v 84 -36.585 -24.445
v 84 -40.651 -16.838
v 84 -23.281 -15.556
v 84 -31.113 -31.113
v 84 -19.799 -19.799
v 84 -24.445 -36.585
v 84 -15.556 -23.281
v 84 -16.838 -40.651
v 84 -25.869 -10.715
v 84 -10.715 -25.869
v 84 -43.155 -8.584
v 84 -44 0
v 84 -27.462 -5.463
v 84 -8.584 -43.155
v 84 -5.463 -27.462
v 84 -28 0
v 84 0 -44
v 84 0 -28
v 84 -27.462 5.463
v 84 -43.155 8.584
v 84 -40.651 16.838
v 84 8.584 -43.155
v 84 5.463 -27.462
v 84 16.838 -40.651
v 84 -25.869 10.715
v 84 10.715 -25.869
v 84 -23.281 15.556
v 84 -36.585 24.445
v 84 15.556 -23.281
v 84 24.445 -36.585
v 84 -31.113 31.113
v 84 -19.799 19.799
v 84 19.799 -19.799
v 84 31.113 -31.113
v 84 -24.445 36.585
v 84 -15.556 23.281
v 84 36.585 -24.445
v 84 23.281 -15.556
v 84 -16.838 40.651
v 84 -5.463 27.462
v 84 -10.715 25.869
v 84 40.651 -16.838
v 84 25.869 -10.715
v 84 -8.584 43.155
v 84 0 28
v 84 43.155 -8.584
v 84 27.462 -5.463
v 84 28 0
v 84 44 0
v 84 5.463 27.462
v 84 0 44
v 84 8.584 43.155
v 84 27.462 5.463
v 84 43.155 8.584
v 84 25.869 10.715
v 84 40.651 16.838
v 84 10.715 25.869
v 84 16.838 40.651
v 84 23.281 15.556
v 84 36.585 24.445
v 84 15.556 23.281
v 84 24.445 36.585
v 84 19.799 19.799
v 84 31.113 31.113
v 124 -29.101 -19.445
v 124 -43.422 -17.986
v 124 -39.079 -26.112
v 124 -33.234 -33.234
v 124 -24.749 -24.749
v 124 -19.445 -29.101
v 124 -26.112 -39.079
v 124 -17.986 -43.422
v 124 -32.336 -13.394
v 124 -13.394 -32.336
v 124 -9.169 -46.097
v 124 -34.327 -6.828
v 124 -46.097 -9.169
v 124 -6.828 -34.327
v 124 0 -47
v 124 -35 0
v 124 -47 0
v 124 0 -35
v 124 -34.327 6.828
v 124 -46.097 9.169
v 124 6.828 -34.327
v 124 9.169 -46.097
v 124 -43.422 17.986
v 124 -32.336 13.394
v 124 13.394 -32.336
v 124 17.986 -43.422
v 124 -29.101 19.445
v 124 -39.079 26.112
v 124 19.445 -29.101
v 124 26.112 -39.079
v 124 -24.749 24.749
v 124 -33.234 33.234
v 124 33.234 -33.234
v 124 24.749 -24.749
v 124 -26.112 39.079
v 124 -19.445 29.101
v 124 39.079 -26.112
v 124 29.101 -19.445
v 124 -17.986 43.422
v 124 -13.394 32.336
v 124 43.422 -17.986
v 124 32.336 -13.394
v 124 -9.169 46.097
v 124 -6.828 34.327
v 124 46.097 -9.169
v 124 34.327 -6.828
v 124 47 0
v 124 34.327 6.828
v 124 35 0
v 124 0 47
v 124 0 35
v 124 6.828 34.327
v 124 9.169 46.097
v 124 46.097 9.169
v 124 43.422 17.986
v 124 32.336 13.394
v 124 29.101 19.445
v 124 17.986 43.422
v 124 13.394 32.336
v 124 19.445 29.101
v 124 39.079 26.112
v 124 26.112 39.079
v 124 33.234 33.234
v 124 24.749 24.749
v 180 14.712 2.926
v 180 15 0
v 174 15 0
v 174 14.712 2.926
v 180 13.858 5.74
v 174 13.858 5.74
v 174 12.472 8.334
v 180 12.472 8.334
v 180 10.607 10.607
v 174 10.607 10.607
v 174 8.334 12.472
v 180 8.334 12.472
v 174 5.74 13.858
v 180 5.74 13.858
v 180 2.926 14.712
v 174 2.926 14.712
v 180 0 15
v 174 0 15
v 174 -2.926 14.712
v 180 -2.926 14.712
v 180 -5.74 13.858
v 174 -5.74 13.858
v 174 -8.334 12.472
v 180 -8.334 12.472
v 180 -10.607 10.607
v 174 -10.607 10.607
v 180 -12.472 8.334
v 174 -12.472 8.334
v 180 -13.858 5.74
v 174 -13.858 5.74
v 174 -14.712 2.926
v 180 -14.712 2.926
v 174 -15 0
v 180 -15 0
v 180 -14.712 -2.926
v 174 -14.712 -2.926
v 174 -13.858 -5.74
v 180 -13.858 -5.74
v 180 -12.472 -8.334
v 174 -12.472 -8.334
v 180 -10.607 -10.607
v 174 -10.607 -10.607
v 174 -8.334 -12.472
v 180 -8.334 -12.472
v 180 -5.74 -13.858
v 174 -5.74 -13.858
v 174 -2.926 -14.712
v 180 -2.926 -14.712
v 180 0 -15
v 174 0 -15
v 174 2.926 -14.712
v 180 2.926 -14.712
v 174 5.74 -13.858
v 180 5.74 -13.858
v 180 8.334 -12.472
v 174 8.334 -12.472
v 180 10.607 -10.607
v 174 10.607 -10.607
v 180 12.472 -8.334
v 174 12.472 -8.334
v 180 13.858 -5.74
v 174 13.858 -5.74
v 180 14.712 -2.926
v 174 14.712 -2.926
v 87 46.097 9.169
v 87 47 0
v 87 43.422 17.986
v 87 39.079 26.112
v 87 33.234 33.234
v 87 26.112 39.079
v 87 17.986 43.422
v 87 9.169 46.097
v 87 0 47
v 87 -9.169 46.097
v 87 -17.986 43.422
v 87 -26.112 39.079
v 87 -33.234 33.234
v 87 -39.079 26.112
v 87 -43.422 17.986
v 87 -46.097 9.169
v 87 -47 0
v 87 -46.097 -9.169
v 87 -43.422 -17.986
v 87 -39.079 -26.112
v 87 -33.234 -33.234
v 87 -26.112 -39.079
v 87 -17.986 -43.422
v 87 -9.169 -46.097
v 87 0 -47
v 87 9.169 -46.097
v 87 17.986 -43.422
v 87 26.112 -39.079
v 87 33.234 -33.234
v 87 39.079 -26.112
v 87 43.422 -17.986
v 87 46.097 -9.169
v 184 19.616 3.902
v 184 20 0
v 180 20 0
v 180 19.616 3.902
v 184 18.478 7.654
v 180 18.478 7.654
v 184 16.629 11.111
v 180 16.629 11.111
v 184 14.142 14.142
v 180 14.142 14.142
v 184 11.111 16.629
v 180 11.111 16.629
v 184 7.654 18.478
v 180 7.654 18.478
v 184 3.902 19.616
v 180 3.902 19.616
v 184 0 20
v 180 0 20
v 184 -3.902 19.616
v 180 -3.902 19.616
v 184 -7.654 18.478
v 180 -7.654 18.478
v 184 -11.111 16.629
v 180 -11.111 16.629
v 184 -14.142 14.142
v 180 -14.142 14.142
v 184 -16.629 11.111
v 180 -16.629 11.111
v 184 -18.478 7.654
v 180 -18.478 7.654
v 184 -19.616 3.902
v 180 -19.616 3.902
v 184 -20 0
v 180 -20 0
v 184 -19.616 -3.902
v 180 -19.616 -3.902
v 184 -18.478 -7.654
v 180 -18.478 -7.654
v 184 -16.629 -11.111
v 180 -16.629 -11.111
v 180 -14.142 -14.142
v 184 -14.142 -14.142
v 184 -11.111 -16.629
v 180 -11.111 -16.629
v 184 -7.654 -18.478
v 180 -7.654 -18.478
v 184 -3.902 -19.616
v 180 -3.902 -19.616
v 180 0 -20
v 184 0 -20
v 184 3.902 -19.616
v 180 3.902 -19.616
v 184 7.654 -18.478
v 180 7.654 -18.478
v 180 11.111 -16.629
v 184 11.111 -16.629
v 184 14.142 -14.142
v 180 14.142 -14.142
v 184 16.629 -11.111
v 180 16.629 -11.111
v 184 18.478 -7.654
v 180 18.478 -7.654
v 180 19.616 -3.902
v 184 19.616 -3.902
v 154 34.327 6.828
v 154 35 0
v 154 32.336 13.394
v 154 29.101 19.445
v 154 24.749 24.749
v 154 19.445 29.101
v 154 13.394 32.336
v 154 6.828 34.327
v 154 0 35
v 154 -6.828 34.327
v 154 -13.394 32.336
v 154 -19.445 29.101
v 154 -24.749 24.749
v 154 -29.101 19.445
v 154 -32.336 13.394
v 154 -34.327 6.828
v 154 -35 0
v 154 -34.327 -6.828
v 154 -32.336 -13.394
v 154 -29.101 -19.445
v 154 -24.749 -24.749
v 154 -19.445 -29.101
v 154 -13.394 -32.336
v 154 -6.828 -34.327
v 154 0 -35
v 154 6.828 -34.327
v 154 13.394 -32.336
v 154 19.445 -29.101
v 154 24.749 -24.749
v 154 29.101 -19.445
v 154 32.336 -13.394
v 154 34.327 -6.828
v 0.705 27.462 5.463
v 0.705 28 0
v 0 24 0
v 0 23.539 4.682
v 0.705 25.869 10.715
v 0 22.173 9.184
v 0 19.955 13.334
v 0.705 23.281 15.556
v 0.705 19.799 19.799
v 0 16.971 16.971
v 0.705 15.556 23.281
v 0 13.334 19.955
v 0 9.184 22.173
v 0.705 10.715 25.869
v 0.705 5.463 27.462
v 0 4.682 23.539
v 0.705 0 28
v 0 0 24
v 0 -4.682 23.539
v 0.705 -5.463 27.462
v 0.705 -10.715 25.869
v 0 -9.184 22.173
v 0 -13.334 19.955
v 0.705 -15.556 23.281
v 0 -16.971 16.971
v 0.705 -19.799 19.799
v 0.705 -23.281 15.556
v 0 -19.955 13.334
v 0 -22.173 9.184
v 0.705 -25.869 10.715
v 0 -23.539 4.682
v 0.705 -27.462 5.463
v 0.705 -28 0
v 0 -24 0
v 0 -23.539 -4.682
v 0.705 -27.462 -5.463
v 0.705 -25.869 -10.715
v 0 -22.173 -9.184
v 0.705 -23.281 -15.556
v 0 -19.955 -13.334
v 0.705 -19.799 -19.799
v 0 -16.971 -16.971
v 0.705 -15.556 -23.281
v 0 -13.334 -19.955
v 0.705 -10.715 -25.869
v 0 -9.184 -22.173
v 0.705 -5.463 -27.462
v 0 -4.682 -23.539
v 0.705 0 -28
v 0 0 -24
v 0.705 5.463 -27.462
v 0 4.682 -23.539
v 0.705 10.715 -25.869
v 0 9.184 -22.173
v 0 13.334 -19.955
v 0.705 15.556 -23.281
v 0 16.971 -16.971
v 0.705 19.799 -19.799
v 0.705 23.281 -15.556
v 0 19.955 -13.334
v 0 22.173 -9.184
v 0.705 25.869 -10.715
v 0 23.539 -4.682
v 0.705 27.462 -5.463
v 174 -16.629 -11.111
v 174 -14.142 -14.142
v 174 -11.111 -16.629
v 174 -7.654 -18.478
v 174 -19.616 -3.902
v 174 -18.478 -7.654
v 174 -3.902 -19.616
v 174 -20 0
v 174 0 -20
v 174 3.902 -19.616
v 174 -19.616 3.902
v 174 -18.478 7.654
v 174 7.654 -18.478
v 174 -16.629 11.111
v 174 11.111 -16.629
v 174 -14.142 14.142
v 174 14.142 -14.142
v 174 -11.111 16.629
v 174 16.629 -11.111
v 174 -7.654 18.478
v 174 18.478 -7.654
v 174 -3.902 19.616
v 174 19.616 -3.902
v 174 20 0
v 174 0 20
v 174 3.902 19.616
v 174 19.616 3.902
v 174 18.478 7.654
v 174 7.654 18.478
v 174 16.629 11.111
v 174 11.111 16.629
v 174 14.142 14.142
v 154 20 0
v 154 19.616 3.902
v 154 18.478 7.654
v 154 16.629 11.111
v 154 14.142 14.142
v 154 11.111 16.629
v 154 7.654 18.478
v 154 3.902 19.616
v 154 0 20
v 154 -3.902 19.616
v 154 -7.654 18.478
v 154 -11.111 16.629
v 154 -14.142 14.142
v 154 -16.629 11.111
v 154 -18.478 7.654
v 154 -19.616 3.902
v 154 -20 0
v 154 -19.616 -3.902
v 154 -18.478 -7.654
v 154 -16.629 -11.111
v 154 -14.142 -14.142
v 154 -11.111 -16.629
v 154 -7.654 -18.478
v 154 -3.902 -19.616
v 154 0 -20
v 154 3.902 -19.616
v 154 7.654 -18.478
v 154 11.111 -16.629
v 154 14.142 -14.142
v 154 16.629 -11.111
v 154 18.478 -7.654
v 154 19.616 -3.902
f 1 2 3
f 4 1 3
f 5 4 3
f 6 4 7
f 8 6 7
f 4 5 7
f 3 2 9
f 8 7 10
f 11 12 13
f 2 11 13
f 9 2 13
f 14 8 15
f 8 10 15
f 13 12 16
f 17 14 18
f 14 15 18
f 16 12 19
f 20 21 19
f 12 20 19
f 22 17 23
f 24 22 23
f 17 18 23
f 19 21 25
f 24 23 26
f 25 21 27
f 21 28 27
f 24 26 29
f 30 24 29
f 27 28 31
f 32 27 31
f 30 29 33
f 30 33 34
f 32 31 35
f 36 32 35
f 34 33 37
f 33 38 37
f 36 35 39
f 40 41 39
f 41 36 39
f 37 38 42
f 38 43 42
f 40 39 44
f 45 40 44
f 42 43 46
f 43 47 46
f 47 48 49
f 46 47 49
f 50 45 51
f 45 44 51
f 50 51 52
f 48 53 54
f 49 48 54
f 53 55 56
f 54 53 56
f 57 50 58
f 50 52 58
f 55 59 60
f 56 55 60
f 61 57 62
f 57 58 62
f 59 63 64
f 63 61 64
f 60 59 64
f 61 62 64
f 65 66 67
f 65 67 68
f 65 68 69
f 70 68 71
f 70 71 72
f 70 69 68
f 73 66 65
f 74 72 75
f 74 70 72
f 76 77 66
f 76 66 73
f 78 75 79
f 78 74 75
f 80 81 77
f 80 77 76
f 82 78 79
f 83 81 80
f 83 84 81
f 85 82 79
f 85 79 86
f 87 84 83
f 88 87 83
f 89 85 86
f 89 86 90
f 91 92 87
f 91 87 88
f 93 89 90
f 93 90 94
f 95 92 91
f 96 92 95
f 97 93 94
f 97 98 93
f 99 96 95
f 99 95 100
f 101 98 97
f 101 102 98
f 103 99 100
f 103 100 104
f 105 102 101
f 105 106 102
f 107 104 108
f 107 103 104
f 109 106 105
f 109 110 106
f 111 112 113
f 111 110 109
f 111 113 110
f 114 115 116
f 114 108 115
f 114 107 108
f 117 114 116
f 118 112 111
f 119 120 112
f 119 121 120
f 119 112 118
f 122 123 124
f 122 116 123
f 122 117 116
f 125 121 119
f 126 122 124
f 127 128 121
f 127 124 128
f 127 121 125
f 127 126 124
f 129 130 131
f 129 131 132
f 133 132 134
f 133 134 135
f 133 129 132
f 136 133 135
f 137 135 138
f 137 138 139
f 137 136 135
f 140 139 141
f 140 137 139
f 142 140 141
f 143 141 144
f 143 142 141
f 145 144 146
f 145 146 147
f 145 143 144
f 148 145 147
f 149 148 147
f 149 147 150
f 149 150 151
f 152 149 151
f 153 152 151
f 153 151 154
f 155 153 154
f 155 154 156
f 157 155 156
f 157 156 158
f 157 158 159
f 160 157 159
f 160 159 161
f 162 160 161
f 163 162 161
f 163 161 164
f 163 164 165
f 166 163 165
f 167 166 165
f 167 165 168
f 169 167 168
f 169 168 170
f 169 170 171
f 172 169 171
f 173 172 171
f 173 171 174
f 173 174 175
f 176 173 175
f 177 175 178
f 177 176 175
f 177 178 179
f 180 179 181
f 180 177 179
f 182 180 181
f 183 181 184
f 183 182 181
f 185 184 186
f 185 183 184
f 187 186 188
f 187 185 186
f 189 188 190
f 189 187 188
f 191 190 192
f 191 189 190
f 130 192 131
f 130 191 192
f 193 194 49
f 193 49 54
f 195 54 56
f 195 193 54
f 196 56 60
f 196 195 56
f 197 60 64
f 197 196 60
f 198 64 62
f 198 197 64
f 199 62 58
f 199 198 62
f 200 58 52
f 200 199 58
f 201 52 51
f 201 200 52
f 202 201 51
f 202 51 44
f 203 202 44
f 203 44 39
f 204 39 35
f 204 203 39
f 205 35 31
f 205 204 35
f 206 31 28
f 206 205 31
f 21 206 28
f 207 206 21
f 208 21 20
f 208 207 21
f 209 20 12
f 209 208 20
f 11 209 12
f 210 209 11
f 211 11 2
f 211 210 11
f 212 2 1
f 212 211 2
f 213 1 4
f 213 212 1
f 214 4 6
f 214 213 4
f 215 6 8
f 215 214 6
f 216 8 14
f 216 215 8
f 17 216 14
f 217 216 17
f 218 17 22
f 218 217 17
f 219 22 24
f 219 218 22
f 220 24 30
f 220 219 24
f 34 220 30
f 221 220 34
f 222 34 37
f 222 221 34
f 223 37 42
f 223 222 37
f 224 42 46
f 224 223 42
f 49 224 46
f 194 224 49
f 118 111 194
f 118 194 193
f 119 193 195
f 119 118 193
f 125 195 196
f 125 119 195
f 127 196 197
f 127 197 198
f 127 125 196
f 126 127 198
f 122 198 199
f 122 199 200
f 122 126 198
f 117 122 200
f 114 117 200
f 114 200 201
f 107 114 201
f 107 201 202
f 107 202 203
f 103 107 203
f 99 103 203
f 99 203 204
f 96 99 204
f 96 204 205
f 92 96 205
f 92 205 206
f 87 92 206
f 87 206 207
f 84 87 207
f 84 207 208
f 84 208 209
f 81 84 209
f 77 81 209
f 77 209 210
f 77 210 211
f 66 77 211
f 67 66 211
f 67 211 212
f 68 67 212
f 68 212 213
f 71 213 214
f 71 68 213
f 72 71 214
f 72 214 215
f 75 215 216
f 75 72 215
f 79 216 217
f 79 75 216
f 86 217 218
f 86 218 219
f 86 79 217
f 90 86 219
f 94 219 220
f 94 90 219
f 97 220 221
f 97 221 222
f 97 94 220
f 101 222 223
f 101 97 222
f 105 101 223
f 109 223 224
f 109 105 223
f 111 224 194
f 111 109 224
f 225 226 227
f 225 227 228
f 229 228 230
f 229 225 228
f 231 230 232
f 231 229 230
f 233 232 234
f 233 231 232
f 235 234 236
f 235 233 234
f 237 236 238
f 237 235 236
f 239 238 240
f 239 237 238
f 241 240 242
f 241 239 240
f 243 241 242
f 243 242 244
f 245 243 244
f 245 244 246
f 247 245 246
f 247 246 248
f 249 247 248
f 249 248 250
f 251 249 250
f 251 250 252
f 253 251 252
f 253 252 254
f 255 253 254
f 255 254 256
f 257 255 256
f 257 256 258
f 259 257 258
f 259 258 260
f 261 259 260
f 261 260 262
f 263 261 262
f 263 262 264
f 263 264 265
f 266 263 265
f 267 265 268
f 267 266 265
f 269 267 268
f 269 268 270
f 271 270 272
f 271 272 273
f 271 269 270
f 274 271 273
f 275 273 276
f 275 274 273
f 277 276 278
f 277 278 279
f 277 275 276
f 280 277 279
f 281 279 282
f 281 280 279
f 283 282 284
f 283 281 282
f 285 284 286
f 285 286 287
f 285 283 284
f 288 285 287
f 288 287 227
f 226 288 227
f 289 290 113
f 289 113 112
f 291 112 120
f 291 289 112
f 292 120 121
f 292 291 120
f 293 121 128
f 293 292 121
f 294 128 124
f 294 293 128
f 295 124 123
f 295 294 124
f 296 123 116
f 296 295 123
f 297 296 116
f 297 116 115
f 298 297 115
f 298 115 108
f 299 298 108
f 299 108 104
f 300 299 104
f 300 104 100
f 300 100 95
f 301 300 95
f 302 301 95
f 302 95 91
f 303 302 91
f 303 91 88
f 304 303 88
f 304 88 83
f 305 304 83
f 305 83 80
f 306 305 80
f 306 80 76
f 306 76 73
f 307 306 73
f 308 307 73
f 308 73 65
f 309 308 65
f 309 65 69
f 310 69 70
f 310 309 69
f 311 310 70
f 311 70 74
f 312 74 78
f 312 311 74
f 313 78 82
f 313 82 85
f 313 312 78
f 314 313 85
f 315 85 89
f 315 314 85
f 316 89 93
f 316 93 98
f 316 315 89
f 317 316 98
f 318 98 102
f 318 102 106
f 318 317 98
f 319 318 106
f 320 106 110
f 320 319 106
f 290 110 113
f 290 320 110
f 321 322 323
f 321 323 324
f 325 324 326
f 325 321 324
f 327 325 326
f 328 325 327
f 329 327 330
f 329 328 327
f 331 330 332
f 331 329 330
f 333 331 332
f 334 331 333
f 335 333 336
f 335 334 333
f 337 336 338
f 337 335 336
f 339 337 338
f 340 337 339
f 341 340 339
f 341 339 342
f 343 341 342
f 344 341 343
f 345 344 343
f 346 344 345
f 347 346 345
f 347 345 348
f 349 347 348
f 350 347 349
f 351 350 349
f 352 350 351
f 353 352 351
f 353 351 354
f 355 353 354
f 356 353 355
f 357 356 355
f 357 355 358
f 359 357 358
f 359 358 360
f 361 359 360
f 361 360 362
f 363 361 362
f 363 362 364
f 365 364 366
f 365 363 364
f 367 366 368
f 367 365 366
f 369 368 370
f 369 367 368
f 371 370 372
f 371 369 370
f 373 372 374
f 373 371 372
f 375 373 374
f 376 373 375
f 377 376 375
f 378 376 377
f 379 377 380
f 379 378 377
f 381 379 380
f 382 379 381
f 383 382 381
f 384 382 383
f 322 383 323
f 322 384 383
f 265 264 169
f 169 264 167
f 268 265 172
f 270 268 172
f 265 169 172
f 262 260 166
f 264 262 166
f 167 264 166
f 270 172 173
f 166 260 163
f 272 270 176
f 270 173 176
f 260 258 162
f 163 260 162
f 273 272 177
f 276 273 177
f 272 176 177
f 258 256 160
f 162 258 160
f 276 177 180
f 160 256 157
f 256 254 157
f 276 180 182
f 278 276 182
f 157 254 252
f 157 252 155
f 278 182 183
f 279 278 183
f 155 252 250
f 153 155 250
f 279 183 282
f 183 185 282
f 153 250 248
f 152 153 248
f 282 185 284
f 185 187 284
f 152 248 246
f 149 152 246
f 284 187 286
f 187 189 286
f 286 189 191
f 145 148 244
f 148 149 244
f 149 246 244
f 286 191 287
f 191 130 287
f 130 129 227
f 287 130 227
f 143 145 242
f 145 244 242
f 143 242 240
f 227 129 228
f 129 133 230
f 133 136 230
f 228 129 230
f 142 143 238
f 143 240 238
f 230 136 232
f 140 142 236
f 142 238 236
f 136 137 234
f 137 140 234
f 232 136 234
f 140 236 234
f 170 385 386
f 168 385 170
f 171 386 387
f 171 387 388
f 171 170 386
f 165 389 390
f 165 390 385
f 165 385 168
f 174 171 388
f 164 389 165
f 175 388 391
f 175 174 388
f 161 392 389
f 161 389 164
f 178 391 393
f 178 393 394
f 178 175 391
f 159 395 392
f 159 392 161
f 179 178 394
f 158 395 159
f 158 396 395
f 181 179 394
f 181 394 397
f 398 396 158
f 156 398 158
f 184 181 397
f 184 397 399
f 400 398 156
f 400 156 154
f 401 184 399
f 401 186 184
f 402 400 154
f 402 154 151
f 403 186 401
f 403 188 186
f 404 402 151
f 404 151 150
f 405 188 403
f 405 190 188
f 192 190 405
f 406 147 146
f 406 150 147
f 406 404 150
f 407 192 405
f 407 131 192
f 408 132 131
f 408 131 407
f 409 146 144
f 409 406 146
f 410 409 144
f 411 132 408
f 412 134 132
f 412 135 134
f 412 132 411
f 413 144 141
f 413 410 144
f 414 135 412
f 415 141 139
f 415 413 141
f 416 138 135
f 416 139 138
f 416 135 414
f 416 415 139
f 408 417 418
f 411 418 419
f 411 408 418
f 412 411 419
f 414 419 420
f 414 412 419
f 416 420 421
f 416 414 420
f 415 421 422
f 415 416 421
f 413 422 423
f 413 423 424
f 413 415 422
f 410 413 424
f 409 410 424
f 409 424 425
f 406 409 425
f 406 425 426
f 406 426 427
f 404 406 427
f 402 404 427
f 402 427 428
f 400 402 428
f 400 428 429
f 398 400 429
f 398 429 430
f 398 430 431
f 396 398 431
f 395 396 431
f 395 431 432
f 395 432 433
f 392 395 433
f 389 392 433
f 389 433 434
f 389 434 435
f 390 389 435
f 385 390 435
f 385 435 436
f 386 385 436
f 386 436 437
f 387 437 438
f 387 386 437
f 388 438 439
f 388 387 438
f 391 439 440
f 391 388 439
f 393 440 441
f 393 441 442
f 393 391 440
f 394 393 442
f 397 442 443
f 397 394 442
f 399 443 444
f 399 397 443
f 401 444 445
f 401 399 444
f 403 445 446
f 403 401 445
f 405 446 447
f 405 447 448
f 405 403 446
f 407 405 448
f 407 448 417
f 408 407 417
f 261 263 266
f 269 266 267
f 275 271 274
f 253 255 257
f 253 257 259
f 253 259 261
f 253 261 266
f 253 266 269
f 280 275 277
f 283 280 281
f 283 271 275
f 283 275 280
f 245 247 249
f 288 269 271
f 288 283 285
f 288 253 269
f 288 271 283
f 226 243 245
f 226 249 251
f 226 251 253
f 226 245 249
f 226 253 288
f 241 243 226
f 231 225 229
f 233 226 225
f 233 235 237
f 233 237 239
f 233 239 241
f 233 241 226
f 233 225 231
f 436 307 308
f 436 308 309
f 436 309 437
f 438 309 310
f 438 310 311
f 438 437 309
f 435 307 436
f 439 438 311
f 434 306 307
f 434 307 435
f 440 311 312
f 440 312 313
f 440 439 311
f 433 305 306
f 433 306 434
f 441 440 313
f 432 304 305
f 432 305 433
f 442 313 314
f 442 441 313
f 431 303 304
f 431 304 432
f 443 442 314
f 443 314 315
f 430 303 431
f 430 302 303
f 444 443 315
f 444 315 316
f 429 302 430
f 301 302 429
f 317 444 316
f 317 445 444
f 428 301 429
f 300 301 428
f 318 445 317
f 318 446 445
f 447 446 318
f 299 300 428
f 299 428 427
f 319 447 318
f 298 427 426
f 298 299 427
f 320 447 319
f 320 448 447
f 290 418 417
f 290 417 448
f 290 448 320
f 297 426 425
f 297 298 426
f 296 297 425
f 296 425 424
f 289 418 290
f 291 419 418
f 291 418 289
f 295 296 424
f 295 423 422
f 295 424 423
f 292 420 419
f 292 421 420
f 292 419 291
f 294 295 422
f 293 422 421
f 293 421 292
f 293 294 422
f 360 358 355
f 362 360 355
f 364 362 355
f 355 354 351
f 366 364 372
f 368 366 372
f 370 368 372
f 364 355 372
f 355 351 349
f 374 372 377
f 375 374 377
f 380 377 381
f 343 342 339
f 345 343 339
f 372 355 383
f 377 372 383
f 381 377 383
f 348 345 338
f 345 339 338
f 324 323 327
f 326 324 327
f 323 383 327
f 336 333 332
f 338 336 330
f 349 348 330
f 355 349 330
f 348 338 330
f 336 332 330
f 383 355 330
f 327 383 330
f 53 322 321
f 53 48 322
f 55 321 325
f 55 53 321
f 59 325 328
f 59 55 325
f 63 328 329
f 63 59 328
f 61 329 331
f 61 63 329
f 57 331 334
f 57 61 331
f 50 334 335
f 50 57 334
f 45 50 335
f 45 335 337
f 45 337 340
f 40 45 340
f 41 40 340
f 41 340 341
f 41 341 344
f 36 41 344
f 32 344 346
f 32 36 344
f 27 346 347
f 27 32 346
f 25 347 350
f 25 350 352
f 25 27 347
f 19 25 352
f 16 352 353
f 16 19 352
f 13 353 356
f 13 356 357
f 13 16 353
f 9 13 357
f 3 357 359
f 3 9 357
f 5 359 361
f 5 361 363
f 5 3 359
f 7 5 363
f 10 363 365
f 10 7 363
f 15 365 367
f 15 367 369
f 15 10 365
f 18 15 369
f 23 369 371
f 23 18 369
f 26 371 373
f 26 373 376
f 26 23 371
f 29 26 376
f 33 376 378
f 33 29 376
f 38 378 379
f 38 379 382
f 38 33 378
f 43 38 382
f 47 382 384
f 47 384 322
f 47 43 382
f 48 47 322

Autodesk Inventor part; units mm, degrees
ref_plane "YZ Plane" through (0, 0, 0) normal (1, 0, 0) x (0, 1, 0)
ref_plane "XZ Plane" through (0, 0, 0) normal (0, 1, 0) x (-1, 0, 0)
ref_plane "XY Plane" through (0, 0, 0) normal (0, 0, 1) x (1, 0, 0)
sketch "Skizze1" plane through (0, 0, 0) normal (0, 0, 1) x (1, 0, 0)
  line L0 (0, 0) -> (184, 0)
  line L1 (0, 0) -> (0, 28)
  line L2 (0, 28) -> (84, 28)
  line L3 (84, 28) -> (84, 47)
  line L4 (84, 47) -> (124, 47)
  line L5 (124, 47) -> (124, 35)
  line L6 (124, 35) -> (154, 35)
  line L7 (154, 35) -> (154, 20)
  line L8 (154, 20) -> (174, 20)
  line L9 (174, 20) -> (174, 15)
  line L10 (174, 15) -> (180, 15)
  line L11 (180, 15) -> (180, 20)
  line L12 (180, 20) -> (184, 20)
  line L13 (184, 20) -> (184, 0)
  dimension "d0" = 184
  dimension "d1" = 4
  dimension "d2" = 20
  dimension "d3" = 30
  dimension "d4" = 40
  dimension "d5" = 40
  dimension "d6" = 30
  dimension "d7" = 84
  dimension "d8" = 56
  dimension "d9" = 94
  dimension "d10" = 70
revolve "Umdrehung1" add sketch "Skizze1" angle 360 about axis through (0, 0, 0) along (1, 0, 0)
chamfer "Fasen1" distance 4 angle 10 1 edges at (0, -28, 0) measured on face at (0, 6.9861, 6.1891)
chamfer "Fasen2" distance 3 angle 45 1 edges at (84, -47, 0)
properties part number "Welle" material "Stahl, galvanisiert"
